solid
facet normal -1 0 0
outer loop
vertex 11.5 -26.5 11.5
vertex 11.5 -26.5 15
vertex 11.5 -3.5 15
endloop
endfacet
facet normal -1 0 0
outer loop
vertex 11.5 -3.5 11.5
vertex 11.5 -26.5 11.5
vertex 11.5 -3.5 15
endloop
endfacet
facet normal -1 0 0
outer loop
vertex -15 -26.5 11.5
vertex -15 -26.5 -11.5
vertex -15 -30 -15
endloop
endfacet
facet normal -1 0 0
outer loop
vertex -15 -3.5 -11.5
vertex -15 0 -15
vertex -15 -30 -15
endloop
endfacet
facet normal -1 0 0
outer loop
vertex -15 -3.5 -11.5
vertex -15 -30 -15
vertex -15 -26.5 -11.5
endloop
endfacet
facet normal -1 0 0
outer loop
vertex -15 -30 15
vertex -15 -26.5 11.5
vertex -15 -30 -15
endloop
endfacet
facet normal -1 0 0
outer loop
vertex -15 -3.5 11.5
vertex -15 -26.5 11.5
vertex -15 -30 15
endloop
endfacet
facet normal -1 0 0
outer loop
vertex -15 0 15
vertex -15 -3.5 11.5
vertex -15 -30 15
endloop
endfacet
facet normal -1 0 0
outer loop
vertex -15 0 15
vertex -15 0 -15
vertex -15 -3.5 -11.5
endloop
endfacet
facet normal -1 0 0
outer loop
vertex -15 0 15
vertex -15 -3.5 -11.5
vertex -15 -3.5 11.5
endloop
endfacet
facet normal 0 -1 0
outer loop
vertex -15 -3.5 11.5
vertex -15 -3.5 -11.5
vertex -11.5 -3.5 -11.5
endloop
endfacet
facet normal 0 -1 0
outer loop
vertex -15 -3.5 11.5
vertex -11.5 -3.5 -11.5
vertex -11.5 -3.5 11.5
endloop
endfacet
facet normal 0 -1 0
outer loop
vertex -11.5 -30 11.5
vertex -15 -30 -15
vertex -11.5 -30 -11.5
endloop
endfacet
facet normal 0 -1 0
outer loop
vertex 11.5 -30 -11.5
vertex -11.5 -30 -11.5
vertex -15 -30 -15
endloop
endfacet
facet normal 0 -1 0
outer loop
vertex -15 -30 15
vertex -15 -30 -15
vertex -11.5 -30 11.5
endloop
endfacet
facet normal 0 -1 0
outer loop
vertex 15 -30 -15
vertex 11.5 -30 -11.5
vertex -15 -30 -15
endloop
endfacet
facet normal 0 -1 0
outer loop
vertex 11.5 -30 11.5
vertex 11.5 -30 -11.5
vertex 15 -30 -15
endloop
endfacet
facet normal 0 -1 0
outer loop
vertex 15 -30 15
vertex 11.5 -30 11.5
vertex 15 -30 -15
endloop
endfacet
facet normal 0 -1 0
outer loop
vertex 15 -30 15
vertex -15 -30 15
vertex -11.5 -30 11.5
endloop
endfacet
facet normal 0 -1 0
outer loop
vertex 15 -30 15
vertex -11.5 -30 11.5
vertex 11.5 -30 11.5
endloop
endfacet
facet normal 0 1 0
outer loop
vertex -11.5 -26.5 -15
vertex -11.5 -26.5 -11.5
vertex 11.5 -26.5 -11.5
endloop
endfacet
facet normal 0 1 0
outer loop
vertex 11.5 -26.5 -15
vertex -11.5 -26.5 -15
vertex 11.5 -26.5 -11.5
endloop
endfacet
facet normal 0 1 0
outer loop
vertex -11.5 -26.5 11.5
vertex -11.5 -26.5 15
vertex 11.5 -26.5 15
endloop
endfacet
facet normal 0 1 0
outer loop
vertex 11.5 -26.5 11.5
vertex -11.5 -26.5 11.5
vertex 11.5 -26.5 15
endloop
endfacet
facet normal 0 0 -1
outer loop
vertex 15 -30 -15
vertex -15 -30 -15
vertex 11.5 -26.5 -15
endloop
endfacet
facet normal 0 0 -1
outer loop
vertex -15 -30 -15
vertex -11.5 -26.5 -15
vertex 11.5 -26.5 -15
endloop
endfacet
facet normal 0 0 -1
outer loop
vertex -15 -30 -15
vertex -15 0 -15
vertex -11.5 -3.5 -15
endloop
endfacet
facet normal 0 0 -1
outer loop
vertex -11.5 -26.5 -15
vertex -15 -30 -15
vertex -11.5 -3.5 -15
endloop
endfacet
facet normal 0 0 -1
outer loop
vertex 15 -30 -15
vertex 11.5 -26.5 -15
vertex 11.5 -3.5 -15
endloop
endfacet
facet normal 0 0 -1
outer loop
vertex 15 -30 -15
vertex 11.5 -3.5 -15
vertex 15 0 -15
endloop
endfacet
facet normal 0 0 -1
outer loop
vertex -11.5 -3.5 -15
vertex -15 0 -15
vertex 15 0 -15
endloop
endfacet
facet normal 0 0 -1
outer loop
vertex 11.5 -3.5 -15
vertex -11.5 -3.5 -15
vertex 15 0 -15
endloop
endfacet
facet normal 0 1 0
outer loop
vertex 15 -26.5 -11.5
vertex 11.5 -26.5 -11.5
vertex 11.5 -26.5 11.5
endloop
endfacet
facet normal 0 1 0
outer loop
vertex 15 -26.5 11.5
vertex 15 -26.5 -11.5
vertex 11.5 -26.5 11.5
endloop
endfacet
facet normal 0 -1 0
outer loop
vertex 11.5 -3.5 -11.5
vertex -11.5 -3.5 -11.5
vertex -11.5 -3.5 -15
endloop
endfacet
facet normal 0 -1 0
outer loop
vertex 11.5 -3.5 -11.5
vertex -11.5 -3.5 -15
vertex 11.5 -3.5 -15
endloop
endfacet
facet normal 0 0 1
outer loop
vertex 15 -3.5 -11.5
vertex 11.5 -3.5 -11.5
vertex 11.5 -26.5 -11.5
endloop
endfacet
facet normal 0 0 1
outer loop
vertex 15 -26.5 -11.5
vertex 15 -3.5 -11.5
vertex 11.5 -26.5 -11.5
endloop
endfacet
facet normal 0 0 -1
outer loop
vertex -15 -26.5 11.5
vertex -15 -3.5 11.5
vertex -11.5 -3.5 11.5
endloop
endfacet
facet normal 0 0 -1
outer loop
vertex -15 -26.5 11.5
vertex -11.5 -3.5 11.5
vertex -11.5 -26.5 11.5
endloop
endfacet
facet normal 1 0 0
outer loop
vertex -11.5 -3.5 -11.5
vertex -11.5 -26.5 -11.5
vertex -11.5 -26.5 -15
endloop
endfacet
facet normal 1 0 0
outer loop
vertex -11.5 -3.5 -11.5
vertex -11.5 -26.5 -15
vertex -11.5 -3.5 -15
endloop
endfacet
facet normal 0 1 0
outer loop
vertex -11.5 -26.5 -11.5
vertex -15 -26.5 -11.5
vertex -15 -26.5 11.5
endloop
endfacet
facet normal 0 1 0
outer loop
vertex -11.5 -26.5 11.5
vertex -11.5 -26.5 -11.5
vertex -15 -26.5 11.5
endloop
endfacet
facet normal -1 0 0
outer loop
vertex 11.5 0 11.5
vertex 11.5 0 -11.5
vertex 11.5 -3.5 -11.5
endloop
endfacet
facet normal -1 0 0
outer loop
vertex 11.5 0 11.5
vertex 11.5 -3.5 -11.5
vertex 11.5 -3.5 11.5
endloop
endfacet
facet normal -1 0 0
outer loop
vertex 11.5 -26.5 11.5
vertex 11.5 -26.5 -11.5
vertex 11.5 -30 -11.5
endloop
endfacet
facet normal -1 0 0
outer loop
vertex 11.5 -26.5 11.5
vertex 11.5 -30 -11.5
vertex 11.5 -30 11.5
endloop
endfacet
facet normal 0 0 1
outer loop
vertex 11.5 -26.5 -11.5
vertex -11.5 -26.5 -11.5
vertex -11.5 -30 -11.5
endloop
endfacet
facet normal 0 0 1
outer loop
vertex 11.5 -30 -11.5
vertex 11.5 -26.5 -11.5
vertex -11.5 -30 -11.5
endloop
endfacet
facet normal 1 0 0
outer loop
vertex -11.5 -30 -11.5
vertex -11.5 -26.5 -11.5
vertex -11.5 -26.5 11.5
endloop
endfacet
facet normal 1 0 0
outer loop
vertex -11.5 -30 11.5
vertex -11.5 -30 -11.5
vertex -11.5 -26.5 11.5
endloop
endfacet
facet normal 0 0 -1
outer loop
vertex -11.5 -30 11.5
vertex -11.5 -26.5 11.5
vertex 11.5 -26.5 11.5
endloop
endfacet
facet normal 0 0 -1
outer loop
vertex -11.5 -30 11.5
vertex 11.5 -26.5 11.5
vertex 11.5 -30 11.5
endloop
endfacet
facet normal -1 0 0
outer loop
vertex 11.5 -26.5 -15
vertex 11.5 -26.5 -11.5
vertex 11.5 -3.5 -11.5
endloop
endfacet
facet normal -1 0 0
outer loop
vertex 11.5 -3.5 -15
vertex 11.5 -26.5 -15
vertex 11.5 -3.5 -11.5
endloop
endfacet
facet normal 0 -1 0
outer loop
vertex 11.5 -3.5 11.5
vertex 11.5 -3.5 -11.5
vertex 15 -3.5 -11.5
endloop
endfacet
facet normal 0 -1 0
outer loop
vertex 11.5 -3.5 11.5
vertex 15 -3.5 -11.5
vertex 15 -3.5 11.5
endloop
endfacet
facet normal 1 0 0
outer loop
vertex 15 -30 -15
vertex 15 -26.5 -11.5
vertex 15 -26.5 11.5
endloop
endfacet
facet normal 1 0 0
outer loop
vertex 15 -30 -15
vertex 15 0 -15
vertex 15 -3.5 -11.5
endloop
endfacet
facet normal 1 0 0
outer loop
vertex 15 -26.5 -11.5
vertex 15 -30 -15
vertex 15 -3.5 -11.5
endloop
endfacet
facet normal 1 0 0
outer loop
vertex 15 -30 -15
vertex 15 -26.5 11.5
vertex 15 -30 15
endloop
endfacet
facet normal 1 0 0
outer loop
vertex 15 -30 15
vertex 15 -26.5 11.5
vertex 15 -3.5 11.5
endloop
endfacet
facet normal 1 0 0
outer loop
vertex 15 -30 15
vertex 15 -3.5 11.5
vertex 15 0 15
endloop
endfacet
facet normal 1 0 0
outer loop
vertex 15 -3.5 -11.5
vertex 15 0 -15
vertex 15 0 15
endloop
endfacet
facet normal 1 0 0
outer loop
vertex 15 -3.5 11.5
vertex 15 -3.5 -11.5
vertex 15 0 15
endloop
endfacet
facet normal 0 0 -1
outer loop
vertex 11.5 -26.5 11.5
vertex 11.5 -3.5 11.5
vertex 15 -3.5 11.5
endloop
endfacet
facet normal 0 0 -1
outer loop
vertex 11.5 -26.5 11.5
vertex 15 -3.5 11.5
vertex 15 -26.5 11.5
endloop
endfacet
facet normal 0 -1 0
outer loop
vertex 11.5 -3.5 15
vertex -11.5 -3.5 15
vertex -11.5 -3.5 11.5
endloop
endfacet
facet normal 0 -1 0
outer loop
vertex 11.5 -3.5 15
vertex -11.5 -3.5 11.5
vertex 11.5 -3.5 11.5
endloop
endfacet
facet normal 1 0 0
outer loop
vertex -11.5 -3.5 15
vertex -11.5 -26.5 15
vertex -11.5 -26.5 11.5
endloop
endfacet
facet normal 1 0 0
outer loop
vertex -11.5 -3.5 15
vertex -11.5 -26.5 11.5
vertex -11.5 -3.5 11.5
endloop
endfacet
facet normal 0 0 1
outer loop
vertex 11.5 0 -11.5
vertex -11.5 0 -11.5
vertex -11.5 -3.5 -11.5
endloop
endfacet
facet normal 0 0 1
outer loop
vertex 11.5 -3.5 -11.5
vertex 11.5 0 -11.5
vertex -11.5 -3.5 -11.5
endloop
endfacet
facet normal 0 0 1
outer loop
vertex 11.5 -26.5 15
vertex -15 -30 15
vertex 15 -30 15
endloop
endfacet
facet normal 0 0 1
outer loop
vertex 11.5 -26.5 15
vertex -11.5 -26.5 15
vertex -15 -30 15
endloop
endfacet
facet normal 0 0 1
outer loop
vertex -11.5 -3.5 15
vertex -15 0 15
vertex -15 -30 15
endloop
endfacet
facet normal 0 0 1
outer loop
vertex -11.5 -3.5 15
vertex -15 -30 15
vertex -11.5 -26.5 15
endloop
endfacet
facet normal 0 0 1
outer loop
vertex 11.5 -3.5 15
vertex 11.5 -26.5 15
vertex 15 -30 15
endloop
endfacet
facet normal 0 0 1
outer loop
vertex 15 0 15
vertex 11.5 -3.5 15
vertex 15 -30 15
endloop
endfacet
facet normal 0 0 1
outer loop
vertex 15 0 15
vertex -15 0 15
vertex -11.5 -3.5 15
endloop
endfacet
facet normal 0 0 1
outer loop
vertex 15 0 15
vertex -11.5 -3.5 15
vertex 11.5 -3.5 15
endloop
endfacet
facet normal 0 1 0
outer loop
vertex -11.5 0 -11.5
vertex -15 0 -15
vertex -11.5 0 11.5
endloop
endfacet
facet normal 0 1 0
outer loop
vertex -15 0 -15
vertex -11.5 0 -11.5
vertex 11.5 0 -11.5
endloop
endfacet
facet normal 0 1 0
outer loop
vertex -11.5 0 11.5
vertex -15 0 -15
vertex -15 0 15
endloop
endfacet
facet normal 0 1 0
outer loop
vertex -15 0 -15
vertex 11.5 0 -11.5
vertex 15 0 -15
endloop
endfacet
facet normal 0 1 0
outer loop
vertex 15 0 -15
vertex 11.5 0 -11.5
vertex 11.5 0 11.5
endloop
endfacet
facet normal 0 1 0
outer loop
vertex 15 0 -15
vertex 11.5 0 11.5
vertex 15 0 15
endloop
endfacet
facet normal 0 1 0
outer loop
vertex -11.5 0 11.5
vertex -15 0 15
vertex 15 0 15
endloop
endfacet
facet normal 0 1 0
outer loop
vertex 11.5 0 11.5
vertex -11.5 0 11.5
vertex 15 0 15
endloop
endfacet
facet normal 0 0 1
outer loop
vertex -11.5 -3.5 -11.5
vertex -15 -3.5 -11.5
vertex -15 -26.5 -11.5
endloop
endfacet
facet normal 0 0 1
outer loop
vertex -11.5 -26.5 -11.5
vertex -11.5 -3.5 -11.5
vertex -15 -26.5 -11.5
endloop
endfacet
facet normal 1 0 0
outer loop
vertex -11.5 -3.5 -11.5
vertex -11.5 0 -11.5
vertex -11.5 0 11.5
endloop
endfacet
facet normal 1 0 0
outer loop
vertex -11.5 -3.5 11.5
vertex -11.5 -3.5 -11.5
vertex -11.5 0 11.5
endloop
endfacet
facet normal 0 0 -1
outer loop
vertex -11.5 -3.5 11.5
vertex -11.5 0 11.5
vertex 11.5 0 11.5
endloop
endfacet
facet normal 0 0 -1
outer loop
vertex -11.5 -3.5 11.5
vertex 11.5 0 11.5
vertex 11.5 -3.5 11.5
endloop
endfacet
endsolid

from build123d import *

# Parameters (mm, degrees)
F0_W     = 30
F0_H     = 30
F1_DEPTH = 30
F2_W     = 23
F2_H     = 23
F3_DEPTH = 30
F4_W     = 23
F4_H     = 23
F5_DEPTH = 30
F6_W     = 23
F6_H     = 23
F7_DEPTH = 30


with BuildPart() as f1:
    # F0 (on Front) → F1 (new body)
    with BuildSketch(Plane.XZ):
        Rectangle(F0_W, F0_H)
    extrude(amount=F1_DEPTH)

    # F2 (on face) → F3 (cut)
    with BuildSketch(Plane(origin=(0, 0, 0), x_dir=(-1, 0, 0), z_dir=(0, 1, 0))):
        Rectangle(F2_W, F2_H)
    extrude(amount=-F3_DEPTH, mode=Mode.SUBTRACT)

    # F4 (on face) → F5 (cut)
    with BuildSketch(Plane(origin=(-15, 0, 0), x_dir=(0, -1, 0), z_dir=(-1, 0, 0))):
        with Locations((15, 0)):
            Rectangle(F4_W, F4_H)
    extrude(amount=-F5_DEPTH, mode=Mode.SUBTRACT)

    # F6 (on face) → F7 (cut)
    with BuildSketch(Plane.XY.offset(15)):
        with Locations((0, -15)):
            Rectangle(F6_W, F6_H)
    extrude(amount=-F7_DEPTH, mode=Mode.SUBTRACT)


solid = f1.part
